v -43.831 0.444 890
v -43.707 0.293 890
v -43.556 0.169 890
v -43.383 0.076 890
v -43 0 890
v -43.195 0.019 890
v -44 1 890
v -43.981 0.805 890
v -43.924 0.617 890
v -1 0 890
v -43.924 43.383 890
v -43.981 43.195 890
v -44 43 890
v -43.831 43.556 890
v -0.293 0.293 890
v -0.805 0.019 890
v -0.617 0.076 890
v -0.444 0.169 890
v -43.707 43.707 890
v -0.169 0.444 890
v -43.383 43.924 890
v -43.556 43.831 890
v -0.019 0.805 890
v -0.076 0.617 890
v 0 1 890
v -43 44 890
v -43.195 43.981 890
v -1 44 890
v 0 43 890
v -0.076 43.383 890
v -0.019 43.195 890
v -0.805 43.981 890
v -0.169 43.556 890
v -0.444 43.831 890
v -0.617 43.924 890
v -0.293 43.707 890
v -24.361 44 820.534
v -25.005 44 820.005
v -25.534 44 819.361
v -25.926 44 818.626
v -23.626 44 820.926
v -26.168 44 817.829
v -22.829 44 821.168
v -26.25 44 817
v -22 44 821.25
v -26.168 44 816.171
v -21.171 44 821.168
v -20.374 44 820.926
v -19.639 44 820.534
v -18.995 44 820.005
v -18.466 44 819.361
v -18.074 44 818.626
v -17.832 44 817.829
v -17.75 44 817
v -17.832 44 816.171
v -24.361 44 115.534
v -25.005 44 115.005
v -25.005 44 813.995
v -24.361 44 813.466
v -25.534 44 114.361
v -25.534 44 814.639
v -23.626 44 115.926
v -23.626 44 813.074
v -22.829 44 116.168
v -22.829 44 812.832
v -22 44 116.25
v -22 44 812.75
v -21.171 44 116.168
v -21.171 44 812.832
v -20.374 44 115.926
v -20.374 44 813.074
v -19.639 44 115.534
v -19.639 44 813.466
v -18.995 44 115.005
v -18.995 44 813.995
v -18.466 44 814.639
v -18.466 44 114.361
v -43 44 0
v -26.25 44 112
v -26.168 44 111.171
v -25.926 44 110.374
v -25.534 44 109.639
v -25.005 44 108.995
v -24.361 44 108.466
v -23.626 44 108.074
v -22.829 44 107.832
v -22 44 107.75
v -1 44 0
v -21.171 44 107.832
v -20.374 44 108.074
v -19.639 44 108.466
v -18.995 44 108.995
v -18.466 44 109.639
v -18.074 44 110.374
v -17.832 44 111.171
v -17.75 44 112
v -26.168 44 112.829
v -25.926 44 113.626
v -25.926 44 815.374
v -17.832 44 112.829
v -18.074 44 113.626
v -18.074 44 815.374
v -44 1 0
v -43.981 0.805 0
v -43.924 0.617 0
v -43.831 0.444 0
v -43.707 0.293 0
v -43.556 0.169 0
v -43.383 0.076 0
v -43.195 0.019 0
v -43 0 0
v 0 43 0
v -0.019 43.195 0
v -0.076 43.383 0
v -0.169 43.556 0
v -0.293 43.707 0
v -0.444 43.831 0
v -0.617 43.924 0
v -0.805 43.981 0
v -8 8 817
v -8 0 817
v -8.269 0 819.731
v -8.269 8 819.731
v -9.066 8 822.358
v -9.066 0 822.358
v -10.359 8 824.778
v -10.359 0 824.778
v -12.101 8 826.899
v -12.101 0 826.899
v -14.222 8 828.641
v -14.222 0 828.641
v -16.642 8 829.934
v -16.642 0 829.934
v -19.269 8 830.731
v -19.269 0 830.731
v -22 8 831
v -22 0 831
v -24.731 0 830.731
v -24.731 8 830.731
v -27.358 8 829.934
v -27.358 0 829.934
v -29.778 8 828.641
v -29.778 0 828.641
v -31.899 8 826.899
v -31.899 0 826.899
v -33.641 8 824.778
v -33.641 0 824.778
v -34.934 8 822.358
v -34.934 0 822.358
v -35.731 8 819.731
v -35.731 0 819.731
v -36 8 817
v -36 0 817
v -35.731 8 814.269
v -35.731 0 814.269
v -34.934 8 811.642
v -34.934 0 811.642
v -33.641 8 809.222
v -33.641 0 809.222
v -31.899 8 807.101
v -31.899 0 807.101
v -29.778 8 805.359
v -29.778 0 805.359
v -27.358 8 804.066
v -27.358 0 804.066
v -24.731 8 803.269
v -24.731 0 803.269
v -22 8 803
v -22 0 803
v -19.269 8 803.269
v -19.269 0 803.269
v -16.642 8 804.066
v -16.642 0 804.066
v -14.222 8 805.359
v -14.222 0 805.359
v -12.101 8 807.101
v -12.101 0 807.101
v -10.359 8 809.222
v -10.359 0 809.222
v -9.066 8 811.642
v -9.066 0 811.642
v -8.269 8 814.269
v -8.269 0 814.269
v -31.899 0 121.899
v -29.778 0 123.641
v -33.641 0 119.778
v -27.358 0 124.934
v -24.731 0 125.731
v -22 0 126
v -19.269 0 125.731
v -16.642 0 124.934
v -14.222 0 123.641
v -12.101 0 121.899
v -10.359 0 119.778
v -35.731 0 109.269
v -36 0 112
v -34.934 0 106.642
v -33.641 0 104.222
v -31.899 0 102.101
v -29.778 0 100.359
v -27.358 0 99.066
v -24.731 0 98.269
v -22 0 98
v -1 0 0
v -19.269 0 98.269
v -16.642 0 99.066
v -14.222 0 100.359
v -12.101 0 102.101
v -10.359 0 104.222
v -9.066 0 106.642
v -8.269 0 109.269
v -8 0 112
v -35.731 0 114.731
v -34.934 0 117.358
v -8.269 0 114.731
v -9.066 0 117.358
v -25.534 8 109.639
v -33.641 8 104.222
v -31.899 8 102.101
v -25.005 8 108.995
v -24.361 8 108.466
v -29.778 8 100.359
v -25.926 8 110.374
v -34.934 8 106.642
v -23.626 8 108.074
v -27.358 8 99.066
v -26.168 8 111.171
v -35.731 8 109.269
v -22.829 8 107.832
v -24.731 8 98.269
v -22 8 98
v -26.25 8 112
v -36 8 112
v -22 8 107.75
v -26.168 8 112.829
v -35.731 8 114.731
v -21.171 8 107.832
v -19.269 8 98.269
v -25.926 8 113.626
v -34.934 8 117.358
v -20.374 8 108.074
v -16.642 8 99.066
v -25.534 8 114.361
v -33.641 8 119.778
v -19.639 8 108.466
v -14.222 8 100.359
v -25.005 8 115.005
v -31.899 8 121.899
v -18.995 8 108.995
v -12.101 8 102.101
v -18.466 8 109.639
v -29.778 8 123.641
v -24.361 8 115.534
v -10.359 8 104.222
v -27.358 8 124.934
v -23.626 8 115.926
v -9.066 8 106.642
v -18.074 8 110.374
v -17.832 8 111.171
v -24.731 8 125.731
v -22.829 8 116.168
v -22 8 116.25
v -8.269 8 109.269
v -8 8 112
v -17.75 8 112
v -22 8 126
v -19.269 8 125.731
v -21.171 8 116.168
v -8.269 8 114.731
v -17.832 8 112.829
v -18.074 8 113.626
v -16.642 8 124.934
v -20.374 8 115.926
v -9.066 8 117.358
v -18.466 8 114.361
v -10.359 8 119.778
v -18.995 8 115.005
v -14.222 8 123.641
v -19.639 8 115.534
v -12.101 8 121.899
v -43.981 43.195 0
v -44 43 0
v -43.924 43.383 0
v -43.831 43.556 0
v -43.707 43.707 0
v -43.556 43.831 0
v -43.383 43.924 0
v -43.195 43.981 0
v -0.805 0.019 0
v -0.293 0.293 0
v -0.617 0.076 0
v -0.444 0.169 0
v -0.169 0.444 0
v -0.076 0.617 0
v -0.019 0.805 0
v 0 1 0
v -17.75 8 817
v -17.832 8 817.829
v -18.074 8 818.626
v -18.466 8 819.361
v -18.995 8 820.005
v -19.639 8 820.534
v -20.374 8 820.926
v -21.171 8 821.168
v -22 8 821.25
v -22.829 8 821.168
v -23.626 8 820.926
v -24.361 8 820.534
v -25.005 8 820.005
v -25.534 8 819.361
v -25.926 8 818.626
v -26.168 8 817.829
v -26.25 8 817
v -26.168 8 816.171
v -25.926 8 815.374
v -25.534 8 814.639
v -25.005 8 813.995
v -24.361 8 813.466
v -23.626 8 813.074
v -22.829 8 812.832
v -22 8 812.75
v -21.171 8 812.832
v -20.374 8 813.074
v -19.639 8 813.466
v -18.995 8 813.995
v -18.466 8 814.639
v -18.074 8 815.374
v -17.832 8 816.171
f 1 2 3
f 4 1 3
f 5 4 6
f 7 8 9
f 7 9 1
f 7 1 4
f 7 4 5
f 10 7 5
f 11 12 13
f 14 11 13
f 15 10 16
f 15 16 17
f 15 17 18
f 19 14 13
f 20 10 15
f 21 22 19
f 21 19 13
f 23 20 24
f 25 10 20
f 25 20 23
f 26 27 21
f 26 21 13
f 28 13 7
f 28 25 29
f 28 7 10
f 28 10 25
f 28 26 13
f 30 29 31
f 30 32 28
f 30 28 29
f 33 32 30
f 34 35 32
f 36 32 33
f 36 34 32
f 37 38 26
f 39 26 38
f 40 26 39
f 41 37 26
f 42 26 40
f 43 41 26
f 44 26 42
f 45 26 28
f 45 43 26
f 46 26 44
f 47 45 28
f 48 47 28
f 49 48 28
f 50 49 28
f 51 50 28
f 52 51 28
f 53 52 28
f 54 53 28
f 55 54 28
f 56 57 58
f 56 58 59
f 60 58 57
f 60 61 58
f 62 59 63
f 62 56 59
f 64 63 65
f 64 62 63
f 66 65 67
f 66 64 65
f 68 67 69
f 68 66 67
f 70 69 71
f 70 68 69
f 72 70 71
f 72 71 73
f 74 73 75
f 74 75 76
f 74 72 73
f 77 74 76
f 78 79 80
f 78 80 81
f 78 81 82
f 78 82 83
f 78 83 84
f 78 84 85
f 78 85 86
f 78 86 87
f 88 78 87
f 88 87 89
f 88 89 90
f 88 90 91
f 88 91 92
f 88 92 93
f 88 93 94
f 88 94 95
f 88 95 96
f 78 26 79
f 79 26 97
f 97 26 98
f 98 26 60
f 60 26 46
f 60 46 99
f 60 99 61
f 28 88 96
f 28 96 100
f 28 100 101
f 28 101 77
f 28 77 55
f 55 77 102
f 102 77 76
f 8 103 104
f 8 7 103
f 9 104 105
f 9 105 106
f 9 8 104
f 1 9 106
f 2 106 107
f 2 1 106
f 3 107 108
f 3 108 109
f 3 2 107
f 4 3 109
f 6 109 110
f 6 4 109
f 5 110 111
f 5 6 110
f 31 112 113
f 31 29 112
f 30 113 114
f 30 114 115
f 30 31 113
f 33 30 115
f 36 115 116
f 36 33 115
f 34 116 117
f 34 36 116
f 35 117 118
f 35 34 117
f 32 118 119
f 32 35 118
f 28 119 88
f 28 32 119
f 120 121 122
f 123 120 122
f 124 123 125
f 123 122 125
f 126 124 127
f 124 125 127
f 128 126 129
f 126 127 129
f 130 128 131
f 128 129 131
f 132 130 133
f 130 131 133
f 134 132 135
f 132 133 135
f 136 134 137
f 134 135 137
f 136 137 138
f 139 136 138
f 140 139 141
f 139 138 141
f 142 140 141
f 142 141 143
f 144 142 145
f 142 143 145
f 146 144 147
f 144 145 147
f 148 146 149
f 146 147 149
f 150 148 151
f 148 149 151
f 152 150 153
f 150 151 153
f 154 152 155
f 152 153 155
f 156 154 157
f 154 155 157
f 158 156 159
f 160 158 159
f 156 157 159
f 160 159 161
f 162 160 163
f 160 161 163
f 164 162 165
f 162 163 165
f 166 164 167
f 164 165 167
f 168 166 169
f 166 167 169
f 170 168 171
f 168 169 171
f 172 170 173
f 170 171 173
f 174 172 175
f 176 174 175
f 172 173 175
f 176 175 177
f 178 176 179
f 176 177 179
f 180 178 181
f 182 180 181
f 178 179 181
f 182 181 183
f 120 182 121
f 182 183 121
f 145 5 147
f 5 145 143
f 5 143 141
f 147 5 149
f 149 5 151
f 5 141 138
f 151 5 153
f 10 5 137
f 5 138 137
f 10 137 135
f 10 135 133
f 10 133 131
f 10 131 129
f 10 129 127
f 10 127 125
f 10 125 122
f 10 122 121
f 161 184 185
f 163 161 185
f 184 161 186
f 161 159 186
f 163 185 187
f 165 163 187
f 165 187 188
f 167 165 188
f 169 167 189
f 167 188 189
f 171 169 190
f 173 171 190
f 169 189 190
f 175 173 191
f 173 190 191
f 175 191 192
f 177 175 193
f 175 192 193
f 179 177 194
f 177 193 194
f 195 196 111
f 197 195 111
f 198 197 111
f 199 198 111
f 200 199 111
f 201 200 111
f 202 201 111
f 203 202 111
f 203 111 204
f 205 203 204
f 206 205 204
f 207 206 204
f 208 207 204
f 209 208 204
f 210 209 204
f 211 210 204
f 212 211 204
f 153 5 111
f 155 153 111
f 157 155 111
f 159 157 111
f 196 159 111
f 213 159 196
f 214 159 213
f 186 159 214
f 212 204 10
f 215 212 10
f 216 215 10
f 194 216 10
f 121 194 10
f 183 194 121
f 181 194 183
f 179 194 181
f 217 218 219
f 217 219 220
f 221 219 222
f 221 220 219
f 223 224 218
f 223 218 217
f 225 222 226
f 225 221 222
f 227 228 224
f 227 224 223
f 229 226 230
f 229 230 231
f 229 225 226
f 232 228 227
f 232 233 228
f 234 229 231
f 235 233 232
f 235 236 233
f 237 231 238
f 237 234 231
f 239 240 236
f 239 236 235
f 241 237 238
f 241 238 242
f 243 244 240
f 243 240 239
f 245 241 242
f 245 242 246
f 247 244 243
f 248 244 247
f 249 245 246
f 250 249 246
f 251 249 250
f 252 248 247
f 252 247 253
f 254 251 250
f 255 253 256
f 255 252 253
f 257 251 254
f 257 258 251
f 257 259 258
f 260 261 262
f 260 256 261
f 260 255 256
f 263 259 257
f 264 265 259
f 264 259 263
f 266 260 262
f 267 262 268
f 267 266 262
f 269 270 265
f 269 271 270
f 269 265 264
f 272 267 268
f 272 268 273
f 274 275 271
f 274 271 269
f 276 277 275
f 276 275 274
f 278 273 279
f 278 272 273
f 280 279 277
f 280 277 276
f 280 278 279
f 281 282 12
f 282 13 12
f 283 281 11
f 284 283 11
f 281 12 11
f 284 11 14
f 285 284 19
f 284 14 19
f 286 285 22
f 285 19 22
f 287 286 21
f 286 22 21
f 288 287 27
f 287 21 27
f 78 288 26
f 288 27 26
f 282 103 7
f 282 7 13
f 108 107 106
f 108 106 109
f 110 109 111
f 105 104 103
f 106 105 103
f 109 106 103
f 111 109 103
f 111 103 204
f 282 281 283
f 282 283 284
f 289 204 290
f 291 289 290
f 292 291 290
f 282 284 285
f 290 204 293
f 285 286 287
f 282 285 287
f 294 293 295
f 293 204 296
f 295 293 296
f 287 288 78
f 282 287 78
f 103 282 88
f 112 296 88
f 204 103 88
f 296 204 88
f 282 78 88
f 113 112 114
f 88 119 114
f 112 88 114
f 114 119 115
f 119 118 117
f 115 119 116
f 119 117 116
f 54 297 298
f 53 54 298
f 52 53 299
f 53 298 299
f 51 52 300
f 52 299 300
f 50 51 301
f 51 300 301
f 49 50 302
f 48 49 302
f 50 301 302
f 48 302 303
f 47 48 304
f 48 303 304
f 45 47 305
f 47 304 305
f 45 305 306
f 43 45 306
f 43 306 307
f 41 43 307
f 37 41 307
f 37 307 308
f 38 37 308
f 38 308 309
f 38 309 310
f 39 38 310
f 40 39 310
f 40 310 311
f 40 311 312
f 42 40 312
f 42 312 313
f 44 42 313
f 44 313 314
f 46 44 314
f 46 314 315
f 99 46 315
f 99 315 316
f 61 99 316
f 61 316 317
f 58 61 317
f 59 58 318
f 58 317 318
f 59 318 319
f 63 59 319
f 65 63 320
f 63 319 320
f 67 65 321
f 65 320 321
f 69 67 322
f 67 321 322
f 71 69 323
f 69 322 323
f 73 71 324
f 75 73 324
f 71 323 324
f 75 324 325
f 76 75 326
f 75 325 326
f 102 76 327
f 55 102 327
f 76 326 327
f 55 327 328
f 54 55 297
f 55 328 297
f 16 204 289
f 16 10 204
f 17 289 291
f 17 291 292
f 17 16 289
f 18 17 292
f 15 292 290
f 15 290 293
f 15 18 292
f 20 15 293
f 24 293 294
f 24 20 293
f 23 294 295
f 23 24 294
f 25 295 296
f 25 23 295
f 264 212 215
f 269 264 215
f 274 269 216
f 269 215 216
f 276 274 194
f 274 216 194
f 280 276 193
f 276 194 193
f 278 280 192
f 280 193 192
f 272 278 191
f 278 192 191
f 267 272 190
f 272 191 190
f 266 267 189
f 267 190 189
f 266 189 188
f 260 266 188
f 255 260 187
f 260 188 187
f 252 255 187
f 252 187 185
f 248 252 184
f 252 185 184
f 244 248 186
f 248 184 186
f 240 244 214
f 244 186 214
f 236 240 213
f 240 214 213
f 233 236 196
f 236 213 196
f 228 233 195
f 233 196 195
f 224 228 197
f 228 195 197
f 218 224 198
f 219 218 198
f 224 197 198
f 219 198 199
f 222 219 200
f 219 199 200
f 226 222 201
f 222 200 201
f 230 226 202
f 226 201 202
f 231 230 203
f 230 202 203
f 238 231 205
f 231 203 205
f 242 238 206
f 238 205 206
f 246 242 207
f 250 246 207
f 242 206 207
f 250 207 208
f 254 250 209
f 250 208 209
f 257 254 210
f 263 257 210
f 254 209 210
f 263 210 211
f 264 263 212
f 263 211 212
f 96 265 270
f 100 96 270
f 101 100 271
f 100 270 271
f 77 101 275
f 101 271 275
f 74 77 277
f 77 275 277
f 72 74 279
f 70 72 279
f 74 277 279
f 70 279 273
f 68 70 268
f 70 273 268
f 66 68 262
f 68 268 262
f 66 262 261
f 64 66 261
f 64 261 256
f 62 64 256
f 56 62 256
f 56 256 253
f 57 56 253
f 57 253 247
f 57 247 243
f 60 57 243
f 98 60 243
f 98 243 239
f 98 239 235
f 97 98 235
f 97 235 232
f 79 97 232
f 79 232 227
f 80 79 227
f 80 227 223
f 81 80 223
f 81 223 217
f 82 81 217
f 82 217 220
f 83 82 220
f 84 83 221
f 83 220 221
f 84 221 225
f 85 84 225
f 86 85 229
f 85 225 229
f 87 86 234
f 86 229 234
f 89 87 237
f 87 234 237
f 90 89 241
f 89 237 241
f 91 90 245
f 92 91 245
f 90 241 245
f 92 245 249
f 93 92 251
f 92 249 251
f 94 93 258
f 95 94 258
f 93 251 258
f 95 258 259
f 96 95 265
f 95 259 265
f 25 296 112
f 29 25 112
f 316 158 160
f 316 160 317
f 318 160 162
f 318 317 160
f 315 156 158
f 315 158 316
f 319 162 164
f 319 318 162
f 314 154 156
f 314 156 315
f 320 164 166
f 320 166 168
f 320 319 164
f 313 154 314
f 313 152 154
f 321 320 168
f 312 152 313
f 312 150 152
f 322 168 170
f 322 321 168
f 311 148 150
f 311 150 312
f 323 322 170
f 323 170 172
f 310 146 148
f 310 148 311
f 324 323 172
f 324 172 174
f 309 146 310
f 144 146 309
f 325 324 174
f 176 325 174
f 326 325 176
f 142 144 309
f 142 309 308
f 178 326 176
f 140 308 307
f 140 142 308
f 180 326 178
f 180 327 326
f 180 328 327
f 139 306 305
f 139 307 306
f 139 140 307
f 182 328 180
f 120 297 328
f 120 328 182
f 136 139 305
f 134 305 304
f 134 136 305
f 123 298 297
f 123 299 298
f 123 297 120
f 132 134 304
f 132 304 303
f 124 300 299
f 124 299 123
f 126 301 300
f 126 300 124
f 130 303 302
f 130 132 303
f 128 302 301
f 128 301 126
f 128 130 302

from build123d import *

# Parameters (mm, degrees)
SKETCH1_W           = 44
SKETCH1_H           = 44
BOSS_EXTRUDE1_DEPTH = 890
FILLET1_R           = 1
SKETCH2_R           = 14
CUT_EXTRUDE1_DEPTH  = 8
SKETCH3_R           = 4.25
CUT_EXTRUDE2_DEPTH  = 37


with BuildPart() as part:
    # Sketch1 → Boss-Extrude1 (new body)
    with BuildSketch(Plane.XY):
        with Locations((-22, 22)):
            Rectangle(SKETCH1_W, SKETCH1_H)
    extrude(amount=BOSS_EXTRUDE1_DEPTH)

    # Fillet1
    fillet1_edges = [part.edges().sort_by_distance(p)[0] for p in [
        (0, 0, 445),
        (-44, 0, 445),
        (-44, 44, 445),
        (0, 44, 445),
    ]]
    fillet(fillet1_edges, radius=FILLET1_R)

    # Sketch2 → Cut-Extrude1 (cut)
    with BuildSketch(Plane.XZ):
        with Locations((-22, 817)):
            Circle(SKETCH2_R)
        with Locations((-22, 112)):
            Circle(SKETCH2_R)
    extrude(amount=-CUT_EXTRUDE1_DEPTH, mode=Mode.SUBTRACT)

    # Sketch3 → Cut-Extrude2 (cut, through all)
    with BuildSketch(Plane.XZ.offset(-8)):
        with Locations((-22, 817)):
            Circle(SKETCH3_R)
        with Locations((-22, 112)):
            Circle(SKETCH3_R)
    extrude(amount=-CUT_EXTRUDE2_DEPTH, mode=Mode.SUBTRACT)


solid = part.part
